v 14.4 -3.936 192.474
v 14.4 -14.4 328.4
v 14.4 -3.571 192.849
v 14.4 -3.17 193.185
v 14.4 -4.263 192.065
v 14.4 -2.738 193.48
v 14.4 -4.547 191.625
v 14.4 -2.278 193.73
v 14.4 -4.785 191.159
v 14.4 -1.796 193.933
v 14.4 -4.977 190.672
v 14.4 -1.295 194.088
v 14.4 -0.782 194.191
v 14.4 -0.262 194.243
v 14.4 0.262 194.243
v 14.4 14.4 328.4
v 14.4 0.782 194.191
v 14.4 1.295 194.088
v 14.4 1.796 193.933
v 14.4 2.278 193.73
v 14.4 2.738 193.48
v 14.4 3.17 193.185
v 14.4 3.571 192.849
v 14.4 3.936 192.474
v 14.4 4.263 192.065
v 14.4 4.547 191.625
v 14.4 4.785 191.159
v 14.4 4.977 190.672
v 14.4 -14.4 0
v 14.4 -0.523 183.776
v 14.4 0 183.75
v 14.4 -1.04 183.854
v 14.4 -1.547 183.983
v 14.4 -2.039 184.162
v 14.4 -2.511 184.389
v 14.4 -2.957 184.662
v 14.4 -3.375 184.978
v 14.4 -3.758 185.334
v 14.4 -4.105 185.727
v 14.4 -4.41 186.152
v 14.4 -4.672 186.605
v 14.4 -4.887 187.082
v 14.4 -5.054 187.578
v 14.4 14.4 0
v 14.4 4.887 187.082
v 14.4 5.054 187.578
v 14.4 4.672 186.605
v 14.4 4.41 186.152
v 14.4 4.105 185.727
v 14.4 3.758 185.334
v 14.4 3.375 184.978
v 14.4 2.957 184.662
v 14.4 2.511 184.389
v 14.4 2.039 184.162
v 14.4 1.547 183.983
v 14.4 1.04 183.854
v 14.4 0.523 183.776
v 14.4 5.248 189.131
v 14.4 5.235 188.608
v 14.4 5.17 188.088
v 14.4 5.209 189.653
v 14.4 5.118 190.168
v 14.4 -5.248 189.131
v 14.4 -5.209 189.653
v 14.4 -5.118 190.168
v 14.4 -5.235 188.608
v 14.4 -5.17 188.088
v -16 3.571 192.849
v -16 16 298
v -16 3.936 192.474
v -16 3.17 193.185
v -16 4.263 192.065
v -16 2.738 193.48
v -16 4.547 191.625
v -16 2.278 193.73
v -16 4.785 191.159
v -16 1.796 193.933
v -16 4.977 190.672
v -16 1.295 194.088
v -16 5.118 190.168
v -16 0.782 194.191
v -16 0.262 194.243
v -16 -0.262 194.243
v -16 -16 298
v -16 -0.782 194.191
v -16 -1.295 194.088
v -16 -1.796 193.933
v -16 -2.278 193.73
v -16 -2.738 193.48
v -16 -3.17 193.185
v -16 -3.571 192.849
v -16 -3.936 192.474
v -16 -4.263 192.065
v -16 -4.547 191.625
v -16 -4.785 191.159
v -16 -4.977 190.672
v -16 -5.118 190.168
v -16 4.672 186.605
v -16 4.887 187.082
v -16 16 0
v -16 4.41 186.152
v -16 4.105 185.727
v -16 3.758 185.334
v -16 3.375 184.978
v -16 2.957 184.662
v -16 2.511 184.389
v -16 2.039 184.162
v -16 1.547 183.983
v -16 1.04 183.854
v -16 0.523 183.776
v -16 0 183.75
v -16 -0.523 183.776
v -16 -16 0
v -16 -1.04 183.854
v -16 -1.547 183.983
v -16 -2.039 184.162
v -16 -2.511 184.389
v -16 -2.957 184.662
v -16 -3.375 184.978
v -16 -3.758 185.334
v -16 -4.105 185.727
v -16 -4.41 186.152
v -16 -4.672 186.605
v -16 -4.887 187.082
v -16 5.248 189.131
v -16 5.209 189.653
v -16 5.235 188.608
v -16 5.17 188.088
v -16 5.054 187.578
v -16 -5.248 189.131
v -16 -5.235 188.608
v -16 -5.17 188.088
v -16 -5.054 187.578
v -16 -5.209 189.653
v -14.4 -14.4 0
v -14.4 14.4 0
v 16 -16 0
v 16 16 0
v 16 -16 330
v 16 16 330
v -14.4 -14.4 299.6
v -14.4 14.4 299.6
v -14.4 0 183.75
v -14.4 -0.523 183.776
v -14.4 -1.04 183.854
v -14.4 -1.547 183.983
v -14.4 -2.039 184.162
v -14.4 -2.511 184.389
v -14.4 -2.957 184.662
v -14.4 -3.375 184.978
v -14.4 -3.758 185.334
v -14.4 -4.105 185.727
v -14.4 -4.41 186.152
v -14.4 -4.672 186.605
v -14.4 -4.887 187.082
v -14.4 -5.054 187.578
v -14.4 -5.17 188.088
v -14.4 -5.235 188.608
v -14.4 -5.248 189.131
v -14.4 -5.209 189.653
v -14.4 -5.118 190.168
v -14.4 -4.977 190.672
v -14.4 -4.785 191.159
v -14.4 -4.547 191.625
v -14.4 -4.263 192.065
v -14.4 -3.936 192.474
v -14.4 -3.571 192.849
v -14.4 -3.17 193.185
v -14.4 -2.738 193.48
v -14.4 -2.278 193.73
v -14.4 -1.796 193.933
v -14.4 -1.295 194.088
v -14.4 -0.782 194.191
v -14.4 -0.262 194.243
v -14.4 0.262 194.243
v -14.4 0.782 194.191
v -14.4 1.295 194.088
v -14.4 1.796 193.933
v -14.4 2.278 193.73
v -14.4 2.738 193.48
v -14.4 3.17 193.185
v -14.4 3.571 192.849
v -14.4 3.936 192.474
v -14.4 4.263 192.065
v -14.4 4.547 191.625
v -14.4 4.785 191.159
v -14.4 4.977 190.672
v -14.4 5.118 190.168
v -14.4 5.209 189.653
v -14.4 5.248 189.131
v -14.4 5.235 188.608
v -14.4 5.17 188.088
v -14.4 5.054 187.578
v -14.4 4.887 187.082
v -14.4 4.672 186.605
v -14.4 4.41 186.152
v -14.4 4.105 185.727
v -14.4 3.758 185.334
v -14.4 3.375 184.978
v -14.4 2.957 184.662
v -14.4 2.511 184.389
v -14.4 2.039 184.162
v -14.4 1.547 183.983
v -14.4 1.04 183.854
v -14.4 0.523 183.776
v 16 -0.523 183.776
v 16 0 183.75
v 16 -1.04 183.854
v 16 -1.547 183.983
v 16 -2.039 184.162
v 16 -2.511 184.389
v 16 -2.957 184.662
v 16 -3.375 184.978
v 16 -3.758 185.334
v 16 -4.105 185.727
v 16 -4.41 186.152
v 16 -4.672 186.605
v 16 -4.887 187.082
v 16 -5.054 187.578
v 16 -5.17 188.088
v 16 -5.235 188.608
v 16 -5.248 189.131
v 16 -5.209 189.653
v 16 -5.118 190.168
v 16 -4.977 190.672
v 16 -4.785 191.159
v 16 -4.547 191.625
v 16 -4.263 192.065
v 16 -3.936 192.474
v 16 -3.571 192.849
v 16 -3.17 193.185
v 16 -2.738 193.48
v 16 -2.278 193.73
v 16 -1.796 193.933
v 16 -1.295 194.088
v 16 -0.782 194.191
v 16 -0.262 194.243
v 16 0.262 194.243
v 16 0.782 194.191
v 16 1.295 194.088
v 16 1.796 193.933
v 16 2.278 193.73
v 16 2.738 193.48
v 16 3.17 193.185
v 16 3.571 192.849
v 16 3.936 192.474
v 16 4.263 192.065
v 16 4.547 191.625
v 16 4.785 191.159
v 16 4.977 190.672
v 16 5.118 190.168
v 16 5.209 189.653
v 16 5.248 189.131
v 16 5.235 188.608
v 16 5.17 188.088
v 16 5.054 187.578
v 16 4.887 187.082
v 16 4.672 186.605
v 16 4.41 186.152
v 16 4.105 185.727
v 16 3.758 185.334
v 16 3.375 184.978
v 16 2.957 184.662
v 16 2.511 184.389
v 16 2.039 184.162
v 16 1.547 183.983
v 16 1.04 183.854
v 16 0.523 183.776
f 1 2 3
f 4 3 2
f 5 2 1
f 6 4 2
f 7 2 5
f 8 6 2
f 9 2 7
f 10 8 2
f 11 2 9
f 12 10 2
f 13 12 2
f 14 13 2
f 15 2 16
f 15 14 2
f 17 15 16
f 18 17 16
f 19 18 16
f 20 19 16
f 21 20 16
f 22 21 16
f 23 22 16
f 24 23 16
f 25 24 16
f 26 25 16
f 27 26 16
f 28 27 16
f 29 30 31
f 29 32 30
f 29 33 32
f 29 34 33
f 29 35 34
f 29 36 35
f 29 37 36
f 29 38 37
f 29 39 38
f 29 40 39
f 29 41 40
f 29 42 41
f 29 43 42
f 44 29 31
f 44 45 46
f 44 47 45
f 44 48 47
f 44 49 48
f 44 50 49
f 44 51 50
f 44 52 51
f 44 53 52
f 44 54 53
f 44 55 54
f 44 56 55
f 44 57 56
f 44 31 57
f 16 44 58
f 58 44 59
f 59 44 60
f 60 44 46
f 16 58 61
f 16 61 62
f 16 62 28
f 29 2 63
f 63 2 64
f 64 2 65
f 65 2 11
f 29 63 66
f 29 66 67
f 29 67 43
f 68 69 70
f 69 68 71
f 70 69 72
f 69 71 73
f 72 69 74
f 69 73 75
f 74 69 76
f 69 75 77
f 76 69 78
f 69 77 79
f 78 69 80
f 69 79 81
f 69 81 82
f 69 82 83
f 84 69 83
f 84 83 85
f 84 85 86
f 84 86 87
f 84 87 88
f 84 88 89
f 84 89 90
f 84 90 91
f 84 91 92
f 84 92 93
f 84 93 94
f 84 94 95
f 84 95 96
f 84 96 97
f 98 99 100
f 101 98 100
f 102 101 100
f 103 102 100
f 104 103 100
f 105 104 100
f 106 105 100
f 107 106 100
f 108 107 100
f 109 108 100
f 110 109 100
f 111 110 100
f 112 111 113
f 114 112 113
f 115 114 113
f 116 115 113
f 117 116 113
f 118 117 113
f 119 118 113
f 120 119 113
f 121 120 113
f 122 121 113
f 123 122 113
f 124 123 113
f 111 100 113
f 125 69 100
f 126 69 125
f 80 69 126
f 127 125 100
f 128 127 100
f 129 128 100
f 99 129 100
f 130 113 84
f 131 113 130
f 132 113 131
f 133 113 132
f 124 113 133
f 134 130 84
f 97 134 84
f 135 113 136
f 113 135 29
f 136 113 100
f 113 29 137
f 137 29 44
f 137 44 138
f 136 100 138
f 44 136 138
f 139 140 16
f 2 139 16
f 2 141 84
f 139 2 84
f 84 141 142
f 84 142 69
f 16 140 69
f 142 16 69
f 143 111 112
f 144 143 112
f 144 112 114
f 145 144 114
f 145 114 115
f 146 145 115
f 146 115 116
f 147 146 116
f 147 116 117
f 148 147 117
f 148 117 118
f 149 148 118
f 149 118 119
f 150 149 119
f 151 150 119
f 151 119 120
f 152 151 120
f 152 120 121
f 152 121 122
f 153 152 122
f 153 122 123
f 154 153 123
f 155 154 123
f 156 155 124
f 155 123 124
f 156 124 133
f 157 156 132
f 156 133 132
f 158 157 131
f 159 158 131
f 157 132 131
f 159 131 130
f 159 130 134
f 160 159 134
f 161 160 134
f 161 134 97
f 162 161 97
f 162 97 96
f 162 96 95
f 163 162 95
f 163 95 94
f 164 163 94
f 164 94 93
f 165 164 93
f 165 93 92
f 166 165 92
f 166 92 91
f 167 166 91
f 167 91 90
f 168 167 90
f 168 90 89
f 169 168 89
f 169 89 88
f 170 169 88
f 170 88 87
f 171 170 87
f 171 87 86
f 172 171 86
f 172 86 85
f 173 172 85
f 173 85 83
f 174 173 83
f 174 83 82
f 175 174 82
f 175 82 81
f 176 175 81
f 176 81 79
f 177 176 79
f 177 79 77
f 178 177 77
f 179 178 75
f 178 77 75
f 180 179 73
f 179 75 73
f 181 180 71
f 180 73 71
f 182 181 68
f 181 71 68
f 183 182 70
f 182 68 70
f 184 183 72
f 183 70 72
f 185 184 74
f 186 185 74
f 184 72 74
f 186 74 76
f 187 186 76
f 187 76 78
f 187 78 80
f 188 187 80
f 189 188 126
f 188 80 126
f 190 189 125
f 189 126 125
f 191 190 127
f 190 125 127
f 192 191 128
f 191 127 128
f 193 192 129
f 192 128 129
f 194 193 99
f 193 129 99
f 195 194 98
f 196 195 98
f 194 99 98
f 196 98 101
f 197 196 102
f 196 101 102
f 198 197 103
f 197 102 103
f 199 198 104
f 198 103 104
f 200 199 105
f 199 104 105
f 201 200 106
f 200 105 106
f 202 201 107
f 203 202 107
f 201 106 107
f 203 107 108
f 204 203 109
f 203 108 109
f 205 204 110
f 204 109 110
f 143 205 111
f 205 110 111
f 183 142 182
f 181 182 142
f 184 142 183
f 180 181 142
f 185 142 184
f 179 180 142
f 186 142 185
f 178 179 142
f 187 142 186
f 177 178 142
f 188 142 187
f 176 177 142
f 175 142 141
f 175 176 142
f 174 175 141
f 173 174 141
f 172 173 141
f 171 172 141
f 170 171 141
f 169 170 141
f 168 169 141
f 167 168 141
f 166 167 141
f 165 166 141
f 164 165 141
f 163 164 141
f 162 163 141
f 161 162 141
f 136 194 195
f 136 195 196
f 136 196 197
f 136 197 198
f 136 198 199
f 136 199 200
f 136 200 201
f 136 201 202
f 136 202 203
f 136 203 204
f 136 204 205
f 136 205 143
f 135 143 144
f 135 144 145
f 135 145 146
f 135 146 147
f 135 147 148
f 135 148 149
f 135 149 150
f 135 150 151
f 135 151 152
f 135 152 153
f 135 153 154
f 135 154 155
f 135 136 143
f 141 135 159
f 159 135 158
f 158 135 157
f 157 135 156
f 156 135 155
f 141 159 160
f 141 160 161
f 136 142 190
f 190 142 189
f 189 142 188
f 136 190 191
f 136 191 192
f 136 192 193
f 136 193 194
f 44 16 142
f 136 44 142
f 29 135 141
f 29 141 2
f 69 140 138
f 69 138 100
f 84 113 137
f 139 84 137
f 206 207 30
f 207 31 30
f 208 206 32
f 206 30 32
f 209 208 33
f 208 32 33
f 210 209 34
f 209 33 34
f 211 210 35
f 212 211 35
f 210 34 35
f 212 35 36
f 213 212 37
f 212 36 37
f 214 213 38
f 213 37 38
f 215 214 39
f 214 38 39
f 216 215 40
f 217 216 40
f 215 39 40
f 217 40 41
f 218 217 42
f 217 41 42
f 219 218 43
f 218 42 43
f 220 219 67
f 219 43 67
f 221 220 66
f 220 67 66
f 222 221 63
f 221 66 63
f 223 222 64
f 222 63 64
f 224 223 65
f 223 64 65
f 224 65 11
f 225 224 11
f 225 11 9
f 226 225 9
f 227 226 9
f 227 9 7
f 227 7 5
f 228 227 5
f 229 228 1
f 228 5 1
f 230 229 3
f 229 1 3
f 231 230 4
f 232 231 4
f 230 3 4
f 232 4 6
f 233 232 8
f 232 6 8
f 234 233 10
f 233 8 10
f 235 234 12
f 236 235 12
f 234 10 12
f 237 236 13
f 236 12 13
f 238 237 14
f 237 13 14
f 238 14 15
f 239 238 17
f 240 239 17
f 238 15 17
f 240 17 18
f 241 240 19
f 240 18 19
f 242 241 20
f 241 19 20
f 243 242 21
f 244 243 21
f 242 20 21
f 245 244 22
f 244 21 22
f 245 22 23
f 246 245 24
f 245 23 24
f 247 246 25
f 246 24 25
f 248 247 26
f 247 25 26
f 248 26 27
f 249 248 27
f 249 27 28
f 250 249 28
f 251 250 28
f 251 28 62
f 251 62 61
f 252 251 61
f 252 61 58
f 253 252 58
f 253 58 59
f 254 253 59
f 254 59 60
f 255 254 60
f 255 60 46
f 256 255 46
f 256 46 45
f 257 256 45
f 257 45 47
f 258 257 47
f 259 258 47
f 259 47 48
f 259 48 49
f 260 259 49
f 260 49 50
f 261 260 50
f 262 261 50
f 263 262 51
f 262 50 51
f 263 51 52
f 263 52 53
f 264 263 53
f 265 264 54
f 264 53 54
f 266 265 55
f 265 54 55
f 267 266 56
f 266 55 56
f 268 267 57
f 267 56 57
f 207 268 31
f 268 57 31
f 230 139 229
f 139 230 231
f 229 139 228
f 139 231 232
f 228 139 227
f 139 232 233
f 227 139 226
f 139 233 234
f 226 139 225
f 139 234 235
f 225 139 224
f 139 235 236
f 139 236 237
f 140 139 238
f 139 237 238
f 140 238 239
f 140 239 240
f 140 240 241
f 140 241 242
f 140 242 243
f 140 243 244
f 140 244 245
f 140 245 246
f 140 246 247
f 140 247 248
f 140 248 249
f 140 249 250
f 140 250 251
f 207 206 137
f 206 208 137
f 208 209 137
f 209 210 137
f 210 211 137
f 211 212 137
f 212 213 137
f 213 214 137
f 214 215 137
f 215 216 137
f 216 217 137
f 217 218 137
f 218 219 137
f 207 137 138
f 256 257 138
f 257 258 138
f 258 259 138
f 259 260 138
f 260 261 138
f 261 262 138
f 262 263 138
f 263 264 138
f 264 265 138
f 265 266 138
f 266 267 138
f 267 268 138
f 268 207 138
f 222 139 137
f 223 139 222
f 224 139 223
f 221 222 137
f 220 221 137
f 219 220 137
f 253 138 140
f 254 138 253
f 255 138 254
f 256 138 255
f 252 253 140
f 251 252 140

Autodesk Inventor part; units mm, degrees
ref_plane "YZ Plane" through (0, 0, 0) normal (1, 0, 0) x (0, 1, 0)
ref_plane "XZ Plane" through (0, 0, 0) normal (0, 1, 0) x (-1, 0, 0)
ref_plane "XY Plane" through (0, 0, 0) normal (0, 0, 1) x (1, 0, 0)
sketch "スケッチ1" plane through (0, 0, 0) normal (0, 0, 1) x (1, 0, 0)
  line L0 (16, 16) -> (-16, 16)
  line L1 (-16, 16) -> (-16, -16)
  line L2 (-16, -16) -> (16, -16)
  line L3 (16, -16) -> (16, 16)
  line L4 (14.4, 14.4) -> (-14.4, 14.4)
  line L5 (-14.4, 14.4) -> (-14.4, -14.4)
  line L6 (-14.4, -14.4) -> (14.4, -14.4)
  line L7 (14.4, -14.4) -> (14.4, 14.4)
  point P0 (0, 0)
  dimension "d6" = 32
  dimension "d7" = 32
  dimension "d8" = 1.6
  dimension "d24" = 16
  dimension "d26" = 16
extrude "押し出し3" add sketch "スケッチ1" along normal blind 330
sketch "スケッチ7" plane through (16, -16, 0) normal (1, 0, 0) x (0, 0, -1)
  line L0 (0, 0) -> (0, 32) projected
  line L1 (0, 0) -> (-330, 0) projected
  point P0 (0, 16)
  point P1 (-189, 16)
  dimension "d15" = 189
  dimension "d16" = 16
hole "穴1" at (16, 0, 189) direction (-1, 0, 0) diameter 10.5 end through all
chamfer "面取り2" distance 32 angle 45 1 edges at (-16, 0, 330)
